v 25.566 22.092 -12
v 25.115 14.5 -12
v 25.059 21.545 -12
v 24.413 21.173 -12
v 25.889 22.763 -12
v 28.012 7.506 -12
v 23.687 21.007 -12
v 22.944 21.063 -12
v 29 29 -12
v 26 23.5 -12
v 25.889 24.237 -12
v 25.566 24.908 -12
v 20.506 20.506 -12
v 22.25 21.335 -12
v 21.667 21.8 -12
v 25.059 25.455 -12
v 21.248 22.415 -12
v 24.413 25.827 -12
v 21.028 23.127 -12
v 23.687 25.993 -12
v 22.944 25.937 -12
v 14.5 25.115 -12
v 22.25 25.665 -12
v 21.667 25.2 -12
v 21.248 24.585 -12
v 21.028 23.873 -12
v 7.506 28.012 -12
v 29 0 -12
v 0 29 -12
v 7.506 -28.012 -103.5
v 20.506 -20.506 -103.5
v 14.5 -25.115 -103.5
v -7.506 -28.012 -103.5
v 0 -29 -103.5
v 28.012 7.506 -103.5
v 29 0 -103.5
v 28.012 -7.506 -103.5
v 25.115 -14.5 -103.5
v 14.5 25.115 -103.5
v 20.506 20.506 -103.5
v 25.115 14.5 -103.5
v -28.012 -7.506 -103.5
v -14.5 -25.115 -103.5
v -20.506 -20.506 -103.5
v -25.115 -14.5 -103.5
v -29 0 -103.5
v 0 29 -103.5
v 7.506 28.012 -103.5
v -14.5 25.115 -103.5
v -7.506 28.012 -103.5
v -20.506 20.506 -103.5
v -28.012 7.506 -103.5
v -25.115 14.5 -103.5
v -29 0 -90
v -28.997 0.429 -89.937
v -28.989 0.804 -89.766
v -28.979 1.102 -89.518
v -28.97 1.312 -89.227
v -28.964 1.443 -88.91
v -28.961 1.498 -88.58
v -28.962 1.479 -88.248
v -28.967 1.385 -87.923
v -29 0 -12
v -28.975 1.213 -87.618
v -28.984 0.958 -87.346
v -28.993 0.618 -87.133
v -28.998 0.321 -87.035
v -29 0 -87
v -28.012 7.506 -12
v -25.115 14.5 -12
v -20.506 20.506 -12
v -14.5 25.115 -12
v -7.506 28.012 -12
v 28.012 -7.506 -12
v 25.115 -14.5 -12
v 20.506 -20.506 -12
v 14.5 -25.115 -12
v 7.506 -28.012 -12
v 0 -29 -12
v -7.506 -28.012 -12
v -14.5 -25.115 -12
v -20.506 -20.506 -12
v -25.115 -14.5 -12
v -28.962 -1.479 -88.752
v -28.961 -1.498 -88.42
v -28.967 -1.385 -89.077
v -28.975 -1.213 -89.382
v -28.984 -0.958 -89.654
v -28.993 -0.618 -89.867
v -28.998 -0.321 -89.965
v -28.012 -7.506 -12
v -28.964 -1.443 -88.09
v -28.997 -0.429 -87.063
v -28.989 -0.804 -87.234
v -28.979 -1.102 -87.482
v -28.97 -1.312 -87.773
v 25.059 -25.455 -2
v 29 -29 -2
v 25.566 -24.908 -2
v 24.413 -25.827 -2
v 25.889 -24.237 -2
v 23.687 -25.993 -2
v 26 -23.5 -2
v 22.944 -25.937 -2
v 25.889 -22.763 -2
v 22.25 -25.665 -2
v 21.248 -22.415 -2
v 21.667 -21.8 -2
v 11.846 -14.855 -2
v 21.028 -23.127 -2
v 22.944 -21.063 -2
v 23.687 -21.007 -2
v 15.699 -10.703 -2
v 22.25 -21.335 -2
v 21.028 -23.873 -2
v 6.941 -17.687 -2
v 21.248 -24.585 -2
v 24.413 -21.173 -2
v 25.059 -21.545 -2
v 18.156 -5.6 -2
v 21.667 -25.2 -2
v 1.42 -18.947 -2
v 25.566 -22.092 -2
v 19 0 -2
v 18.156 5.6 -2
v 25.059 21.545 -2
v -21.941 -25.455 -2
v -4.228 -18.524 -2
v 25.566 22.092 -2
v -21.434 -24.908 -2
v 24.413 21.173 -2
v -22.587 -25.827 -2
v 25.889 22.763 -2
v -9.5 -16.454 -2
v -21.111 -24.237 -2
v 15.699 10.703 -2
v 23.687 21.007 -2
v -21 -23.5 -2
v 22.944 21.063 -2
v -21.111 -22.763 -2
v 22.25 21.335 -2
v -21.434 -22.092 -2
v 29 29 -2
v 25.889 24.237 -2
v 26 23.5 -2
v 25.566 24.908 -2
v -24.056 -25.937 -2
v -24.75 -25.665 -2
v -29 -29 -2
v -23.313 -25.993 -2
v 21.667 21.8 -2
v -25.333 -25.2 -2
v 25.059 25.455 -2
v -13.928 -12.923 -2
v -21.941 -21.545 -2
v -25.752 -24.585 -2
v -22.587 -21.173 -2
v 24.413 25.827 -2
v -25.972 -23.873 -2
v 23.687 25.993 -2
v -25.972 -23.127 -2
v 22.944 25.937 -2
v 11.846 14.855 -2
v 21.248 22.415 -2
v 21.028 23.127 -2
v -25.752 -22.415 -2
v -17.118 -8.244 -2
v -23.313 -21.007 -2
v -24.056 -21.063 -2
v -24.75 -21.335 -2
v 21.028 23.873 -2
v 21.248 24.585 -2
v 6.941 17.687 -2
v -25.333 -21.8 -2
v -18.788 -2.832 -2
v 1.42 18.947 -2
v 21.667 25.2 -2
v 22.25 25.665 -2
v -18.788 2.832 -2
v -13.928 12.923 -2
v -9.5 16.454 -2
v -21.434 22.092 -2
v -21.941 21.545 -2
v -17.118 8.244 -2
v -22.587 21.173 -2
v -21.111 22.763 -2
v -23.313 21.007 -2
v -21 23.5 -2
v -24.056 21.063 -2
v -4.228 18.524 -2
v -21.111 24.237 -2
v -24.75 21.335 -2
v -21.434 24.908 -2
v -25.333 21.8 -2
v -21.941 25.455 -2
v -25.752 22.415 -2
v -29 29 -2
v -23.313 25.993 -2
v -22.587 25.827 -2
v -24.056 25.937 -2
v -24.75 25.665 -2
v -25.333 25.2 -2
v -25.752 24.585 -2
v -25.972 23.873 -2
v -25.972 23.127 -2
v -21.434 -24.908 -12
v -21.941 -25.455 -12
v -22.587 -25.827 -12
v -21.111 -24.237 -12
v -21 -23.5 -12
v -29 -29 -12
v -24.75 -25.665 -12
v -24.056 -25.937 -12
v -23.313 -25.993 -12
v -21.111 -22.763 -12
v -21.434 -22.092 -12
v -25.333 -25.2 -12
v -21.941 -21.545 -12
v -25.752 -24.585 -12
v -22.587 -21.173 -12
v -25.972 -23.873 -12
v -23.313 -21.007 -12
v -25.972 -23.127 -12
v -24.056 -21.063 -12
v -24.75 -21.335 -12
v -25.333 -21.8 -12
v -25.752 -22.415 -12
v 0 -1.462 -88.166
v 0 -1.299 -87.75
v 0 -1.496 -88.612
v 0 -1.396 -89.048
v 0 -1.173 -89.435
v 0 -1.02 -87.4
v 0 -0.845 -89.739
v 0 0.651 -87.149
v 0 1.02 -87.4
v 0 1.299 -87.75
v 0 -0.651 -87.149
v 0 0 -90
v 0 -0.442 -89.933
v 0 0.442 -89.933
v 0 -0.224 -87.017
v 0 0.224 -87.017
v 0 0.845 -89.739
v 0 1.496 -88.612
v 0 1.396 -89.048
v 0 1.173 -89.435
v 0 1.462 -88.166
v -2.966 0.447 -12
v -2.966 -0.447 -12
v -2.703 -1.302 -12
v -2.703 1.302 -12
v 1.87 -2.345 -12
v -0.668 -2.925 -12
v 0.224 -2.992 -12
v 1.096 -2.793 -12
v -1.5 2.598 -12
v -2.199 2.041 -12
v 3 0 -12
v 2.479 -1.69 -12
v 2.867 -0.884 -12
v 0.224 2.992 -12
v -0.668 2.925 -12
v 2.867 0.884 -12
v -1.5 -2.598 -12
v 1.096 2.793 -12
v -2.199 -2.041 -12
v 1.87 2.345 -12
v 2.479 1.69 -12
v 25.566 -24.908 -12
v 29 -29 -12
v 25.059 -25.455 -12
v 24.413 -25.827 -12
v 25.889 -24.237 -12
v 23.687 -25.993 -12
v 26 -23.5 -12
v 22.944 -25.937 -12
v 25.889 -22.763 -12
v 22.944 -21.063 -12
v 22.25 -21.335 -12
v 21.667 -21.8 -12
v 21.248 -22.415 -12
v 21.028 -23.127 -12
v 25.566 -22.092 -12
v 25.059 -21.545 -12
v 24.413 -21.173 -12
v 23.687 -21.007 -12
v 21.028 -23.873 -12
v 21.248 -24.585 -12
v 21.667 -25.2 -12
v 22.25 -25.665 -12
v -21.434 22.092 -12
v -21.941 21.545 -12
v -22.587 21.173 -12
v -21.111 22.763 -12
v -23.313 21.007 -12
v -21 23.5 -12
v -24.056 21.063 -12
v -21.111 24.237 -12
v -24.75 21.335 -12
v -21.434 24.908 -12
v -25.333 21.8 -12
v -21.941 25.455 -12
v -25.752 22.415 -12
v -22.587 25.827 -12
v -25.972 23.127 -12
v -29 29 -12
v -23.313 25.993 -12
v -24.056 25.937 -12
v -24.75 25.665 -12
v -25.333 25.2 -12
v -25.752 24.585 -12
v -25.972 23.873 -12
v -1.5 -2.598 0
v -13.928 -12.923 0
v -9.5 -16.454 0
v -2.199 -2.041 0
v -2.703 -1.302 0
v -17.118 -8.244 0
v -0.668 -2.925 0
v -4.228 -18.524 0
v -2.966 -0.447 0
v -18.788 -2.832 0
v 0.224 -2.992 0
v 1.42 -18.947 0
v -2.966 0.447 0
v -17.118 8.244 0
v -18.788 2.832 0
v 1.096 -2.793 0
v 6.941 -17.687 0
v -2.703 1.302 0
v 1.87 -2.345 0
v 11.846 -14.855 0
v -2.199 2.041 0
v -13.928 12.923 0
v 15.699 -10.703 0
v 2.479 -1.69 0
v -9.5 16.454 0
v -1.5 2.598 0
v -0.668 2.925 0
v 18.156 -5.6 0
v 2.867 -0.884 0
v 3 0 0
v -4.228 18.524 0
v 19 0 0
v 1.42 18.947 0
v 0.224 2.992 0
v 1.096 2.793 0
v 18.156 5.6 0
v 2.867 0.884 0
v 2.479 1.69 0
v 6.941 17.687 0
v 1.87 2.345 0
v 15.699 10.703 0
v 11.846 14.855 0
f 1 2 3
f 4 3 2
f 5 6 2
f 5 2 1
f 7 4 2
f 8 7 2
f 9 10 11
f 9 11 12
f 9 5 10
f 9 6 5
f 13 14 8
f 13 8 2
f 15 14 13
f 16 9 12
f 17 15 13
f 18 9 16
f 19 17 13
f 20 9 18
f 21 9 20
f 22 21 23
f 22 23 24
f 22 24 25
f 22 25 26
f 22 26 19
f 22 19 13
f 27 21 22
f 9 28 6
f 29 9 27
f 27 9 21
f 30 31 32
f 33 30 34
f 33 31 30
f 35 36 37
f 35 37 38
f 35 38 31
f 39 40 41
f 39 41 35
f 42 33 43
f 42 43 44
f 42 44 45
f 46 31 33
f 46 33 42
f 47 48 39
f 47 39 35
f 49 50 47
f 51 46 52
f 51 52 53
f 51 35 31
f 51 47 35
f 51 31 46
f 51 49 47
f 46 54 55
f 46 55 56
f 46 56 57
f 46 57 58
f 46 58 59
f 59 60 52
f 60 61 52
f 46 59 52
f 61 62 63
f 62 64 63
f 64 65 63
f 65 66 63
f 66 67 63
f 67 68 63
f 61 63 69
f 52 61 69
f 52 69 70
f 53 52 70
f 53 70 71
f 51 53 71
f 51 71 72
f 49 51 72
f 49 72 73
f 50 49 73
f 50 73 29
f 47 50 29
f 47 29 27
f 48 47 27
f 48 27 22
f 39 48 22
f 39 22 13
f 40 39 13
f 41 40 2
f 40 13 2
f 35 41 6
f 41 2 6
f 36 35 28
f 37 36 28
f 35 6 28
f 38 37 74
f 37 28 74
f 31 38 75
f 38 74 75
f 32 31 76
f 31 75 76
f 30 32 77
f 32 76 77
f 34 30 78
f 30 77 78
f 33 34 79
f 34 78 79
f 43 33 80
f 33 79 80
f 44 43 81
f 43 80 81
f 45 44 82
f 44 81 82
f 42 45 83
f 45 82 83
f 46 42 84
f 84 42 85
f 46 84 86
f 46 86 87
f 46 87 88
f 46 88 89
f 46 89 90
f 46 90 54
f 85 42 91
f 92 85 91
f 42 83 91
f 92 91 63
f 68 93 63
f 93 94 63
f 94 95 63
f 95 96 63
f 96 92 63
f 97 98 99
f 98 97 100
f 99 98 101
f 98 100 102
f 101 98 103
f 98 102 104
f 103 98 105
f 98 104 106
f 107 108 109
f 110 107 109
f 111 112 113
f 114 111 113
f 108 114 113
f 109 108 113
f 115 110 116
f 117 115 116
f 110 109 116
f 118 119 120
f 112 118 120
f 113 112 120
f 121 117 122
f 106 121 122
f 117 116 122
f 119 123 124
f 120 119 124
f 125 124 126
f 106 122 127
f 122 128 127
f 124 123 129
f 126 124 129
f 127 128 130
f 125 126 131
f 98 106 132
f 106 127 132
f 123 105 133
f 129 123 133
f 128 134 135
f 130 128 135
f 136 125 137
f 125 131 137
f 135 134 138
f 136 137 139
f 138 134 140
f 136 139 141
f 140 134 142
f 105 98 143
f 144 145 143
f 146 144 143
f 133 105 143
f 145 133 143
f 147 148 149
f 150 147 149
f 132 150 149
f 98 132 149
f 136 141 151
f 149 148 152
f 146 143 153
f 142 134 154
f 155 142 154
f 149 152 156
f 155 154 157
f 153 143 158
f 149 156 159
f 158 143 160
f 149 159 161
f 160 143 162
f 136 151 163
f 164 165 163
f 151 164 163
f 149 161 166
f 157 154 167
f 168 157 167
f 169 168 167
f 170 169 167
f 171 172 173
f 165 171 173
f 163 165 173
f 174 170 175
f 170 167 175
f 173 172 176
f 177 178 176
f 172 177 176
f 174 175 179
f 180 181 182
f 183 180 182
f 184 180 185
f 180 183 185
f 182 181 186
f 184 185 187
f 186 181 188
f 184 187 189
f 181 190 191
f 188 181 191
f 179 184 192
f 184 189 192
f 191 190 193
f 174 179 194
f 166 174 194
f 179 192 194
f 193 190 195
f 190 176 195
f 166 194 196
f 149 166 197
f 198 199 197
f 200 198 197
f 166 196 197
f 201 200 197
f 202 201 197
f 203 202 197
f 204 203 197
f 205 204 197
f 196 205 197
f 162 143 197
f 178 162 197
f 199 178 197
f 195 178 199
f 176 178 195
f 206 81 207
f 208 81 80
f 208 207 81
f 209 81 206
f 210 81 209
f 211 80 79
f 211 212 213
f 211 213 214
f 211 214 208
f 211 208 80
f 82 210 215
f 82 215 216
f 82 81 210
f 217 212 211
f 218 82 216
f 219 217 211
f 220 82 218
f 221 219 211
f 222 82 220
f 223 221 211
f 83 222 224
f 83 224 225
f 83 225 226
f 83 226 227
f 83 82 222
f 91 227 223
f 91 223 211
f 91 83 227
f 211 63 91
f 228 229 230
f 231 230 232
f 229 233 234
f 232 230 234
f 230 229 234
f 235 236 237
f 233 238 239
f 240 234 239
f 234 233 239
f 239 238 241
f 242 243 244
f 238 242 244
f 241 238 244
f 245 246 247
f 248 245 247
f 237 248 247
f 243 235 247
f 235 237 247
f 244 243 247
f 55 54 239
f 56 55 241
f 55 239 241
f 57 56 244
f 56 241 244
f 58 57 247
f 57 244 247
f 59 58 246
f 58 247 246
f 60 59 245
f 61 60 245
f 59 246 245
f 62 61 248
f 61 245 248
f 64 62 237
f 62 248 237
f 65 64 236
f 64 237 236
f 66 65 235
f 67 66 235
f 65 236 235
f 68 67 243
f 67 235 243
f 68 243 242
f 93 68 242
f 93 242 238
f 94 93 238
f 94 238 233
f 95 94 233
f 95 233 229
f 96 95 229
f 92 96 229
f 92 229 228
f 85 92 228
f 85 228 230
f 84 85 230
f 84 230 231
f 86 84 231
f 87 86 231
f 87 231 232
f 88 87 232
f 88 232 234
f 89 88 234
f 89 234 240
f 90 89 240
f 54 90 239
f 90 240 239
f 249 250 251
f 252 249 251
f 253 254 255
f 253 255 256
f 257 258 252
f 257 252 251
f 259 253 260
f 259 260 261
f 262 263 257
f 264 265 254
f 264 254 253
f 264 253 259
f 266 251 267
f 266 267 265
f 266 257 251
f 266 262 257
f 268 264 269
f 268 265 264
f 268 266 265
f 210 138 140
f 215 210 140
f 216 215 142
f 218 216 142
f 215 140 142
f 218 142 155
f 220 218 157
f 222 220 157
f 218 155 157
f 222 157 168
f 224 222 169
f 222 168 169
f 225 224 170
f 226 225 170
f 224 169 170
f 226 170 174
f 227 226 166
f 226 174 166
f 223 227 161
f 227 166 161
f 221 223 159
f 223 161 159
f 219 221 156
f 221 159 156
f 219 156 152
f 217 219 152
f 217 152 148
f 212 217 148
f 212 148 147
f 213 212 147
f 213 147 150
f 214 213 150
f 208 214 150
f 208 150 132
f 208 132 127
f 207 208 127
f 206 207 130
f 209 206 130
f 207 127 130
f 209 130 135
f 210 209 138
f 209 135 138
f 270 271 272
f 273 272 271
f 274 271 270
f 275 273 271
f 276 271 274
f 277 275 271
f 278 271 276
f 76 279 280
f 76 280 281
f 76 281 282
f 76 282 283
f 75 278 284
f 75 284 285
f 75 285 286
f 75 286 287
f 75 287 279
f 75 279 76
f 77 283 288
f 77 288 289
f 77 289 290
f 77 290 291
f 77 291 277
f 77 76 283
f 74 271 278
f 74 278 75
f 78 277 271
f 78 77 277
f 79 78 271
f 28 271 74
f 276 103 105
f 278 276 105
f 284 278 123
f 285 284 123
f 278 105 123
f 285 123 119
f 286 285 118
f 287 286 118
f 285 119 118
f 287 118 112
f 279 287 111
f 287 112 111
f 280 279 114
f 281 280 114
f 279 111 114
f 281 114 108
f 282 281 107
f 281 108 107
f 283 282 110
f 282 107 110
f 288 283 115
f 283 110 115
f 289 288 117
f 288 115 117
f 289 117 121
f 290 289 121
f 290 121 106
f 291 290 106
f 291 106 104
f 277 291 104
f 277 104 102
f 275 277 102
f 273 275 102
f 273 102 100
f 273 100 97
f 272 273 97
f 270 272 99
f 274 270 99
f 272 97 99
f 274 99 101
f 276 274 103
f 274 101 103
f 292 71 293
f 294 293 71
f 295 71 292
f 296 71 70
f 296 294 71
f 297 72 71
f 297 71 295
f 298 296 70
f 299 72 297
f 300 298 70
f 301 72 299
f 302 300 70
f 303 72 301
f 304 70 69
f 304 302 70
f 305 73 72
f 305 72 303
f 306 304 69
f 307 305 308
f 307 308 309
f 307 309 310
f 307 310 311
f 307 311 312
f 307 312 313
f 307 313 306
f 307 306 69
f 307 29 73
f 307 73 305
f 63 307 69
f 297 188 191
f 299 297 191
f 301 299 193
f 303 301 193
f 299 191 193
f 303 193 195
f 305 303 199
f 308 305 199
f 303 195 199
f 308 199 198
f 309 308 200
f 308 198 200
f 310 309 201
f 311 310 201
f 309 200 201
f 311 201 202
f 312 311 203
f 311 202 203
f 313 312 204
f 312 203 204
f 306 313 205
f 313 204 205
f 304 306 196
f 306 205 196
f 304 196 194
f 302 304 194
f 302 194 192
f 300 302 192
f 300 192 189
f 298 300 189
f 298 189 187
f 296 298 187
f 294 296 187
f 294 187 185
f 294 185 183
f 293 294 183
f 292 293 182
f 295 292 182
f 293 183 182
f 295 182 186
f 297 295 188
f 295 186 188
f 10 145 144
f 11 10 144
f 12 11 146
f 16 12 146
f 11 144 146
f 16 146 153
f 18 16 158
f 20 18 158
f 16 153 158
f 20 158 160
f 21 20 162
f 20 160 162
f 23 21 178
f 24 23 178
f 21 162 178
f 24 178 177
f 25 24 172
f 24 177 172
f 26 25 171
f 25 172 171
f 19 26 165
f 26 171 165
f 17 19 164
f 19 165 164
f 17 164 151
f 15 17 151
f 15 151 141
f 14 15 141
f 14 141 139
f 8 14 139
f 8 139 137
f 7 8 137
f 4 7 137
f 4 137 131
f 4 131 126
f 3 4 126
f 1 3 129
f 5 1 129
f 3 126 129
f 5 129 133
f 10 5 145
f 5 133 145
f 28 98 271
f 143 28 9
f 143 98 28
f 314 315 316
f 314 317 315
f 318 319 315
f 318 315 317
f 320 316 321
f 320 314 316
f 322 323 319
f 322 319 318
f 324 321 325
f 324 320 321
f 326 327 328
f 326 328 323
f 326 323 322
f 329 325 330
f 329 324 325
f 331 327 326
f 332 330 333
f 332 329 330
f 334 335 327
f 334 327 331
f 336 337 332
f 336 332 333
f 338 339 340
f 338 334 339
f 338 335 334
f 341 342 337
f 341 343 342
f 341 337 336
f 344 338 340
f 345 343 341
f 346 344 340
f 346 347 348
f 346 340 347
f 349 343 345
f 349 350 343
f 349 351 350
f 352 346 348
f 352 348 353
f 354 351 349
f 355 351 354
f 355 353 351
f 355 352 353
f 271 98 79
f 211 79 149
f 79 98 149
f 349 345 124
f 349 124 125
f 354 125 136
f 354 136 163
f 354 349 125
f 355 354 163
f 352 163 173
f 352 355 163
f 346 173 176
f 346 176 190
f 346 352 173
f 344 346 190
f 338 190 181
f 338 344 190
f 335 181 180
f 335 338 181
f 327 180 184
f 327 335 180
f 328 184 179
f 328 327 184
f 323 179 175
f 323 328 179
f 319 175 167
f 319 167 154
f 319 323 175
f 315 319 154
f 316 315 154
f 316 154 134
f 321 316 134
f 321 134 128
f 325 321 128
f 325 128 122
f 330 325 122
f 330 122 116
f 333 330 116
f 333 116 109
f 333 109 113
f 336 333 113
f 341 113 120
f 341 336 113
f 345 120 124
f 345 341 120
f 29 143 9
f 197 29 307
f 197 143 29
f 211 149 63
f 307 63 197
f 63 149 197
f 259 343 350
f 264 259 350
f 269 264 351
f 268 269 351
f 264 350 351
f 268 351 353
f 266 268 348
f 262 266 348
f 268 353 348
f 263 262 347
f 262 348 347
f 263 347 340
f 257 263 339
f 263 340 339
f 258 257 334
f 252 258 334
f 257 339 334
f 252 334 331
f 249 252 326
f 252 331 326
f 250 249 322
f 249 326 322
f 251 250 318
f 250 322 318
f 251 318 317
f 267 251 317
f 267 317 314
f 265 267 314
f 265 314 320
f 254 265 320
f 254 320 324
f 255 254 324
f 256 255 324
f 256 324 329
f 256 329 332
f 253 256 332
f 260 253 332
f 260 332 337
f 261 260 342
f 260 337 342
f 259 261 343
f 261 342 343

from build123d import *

# Parameters (mm, degrees)
SKETCH1_R           = 19
BOSS_EXTRUDE1_DEPTH = 2
SKETCH3_W           = 58
SKETCH3_H           = 58
BOSS_EXTRUDE2_DEPTH = 10
SKETCH4_R           = 29
BOSS_EXTRUDE3_DEPTH = 91.5
SKETCH5_R           = 2.5
CUT_EXTRUDE1_DEPTH  = 10
SKETCH6_R           = 3
CUT_EXTRUDE2_DEPTH  = 12
SKETCH7_R           = 1.5
CUT_EXTRUDE4_DEPTH  = 30


with BuildPart() as part:
    # Sketch1 → Boss-Extrude1 (new body)
    with BuildSketch(Plane.XY):
        Circle(SKETCH1_R)
    extrude(amount=-BOSS_EXTRUDE1_DEPTH)

    # Sketch3 → Boss-Extrude2 (add)
    with BuildSketch(Plane(origin=(0, 0, -2), x_dir=(-1, 0, 0), z_dir=(0, 0, -1))):
        Rectangle(SKETCH3_W, SKETCH3_H)
    extrude(amount=BOSS_EXTRUDE2_DEPTH)

    # Sketch4 → Boss-Extrude3 (add)
    with BuildSketch(Plane(origin=(0, 0, -12), x_dir=(-1, 0, 0), z_dir=(0, 0, -1))):
        Circle(SKETCH4_R)
    extrude(amount=BOSS_EXTRUDE3_DEPTH)

    # Sketch5 → Cut-Extrude1 (cut)
    with BuildSketch(Plane.XY.offset(-2)):
        with Locations((-23.5, 23.5)):
            Circle(SKETCH5_R)
        with Locations((23.5, 23.5)):
            Circle(SKETCH5_R)
        with Locations((23.5, -23.5)):
            Circle(SKETCH5_R)
        with Locations((-23.5, -23.5)):
            Circle(SKETCH5_R)
    extrude(amount=-CUT_EXTRUDE1_DEPTH, mode=Mode.SUBTRACT)

    # Sketch6 → Cut-Extrude2 (cut)
    with BuildSketch(Plane.XY):
        Circle(SKETCH6_R)
    extrude(amount=-CUT_EXTRUDE2_DEPTH, mode=Mode.SUBTRACT)

    # Sketch7 → Cut-Extrude4 (cut, through all)
    with BuildSketch(Plane(origin=(0, 0, 0), x_dir=(0, 0, -1), z_dir=(1, 0, 0))):
        with Locations((88.5, 0)):
            Circle(SKETCH7_R)
    extrude(amount=-CUT_EXTRUDE4_DEPTH, mode=Mode.SUBTRACT)


solid = part.part
